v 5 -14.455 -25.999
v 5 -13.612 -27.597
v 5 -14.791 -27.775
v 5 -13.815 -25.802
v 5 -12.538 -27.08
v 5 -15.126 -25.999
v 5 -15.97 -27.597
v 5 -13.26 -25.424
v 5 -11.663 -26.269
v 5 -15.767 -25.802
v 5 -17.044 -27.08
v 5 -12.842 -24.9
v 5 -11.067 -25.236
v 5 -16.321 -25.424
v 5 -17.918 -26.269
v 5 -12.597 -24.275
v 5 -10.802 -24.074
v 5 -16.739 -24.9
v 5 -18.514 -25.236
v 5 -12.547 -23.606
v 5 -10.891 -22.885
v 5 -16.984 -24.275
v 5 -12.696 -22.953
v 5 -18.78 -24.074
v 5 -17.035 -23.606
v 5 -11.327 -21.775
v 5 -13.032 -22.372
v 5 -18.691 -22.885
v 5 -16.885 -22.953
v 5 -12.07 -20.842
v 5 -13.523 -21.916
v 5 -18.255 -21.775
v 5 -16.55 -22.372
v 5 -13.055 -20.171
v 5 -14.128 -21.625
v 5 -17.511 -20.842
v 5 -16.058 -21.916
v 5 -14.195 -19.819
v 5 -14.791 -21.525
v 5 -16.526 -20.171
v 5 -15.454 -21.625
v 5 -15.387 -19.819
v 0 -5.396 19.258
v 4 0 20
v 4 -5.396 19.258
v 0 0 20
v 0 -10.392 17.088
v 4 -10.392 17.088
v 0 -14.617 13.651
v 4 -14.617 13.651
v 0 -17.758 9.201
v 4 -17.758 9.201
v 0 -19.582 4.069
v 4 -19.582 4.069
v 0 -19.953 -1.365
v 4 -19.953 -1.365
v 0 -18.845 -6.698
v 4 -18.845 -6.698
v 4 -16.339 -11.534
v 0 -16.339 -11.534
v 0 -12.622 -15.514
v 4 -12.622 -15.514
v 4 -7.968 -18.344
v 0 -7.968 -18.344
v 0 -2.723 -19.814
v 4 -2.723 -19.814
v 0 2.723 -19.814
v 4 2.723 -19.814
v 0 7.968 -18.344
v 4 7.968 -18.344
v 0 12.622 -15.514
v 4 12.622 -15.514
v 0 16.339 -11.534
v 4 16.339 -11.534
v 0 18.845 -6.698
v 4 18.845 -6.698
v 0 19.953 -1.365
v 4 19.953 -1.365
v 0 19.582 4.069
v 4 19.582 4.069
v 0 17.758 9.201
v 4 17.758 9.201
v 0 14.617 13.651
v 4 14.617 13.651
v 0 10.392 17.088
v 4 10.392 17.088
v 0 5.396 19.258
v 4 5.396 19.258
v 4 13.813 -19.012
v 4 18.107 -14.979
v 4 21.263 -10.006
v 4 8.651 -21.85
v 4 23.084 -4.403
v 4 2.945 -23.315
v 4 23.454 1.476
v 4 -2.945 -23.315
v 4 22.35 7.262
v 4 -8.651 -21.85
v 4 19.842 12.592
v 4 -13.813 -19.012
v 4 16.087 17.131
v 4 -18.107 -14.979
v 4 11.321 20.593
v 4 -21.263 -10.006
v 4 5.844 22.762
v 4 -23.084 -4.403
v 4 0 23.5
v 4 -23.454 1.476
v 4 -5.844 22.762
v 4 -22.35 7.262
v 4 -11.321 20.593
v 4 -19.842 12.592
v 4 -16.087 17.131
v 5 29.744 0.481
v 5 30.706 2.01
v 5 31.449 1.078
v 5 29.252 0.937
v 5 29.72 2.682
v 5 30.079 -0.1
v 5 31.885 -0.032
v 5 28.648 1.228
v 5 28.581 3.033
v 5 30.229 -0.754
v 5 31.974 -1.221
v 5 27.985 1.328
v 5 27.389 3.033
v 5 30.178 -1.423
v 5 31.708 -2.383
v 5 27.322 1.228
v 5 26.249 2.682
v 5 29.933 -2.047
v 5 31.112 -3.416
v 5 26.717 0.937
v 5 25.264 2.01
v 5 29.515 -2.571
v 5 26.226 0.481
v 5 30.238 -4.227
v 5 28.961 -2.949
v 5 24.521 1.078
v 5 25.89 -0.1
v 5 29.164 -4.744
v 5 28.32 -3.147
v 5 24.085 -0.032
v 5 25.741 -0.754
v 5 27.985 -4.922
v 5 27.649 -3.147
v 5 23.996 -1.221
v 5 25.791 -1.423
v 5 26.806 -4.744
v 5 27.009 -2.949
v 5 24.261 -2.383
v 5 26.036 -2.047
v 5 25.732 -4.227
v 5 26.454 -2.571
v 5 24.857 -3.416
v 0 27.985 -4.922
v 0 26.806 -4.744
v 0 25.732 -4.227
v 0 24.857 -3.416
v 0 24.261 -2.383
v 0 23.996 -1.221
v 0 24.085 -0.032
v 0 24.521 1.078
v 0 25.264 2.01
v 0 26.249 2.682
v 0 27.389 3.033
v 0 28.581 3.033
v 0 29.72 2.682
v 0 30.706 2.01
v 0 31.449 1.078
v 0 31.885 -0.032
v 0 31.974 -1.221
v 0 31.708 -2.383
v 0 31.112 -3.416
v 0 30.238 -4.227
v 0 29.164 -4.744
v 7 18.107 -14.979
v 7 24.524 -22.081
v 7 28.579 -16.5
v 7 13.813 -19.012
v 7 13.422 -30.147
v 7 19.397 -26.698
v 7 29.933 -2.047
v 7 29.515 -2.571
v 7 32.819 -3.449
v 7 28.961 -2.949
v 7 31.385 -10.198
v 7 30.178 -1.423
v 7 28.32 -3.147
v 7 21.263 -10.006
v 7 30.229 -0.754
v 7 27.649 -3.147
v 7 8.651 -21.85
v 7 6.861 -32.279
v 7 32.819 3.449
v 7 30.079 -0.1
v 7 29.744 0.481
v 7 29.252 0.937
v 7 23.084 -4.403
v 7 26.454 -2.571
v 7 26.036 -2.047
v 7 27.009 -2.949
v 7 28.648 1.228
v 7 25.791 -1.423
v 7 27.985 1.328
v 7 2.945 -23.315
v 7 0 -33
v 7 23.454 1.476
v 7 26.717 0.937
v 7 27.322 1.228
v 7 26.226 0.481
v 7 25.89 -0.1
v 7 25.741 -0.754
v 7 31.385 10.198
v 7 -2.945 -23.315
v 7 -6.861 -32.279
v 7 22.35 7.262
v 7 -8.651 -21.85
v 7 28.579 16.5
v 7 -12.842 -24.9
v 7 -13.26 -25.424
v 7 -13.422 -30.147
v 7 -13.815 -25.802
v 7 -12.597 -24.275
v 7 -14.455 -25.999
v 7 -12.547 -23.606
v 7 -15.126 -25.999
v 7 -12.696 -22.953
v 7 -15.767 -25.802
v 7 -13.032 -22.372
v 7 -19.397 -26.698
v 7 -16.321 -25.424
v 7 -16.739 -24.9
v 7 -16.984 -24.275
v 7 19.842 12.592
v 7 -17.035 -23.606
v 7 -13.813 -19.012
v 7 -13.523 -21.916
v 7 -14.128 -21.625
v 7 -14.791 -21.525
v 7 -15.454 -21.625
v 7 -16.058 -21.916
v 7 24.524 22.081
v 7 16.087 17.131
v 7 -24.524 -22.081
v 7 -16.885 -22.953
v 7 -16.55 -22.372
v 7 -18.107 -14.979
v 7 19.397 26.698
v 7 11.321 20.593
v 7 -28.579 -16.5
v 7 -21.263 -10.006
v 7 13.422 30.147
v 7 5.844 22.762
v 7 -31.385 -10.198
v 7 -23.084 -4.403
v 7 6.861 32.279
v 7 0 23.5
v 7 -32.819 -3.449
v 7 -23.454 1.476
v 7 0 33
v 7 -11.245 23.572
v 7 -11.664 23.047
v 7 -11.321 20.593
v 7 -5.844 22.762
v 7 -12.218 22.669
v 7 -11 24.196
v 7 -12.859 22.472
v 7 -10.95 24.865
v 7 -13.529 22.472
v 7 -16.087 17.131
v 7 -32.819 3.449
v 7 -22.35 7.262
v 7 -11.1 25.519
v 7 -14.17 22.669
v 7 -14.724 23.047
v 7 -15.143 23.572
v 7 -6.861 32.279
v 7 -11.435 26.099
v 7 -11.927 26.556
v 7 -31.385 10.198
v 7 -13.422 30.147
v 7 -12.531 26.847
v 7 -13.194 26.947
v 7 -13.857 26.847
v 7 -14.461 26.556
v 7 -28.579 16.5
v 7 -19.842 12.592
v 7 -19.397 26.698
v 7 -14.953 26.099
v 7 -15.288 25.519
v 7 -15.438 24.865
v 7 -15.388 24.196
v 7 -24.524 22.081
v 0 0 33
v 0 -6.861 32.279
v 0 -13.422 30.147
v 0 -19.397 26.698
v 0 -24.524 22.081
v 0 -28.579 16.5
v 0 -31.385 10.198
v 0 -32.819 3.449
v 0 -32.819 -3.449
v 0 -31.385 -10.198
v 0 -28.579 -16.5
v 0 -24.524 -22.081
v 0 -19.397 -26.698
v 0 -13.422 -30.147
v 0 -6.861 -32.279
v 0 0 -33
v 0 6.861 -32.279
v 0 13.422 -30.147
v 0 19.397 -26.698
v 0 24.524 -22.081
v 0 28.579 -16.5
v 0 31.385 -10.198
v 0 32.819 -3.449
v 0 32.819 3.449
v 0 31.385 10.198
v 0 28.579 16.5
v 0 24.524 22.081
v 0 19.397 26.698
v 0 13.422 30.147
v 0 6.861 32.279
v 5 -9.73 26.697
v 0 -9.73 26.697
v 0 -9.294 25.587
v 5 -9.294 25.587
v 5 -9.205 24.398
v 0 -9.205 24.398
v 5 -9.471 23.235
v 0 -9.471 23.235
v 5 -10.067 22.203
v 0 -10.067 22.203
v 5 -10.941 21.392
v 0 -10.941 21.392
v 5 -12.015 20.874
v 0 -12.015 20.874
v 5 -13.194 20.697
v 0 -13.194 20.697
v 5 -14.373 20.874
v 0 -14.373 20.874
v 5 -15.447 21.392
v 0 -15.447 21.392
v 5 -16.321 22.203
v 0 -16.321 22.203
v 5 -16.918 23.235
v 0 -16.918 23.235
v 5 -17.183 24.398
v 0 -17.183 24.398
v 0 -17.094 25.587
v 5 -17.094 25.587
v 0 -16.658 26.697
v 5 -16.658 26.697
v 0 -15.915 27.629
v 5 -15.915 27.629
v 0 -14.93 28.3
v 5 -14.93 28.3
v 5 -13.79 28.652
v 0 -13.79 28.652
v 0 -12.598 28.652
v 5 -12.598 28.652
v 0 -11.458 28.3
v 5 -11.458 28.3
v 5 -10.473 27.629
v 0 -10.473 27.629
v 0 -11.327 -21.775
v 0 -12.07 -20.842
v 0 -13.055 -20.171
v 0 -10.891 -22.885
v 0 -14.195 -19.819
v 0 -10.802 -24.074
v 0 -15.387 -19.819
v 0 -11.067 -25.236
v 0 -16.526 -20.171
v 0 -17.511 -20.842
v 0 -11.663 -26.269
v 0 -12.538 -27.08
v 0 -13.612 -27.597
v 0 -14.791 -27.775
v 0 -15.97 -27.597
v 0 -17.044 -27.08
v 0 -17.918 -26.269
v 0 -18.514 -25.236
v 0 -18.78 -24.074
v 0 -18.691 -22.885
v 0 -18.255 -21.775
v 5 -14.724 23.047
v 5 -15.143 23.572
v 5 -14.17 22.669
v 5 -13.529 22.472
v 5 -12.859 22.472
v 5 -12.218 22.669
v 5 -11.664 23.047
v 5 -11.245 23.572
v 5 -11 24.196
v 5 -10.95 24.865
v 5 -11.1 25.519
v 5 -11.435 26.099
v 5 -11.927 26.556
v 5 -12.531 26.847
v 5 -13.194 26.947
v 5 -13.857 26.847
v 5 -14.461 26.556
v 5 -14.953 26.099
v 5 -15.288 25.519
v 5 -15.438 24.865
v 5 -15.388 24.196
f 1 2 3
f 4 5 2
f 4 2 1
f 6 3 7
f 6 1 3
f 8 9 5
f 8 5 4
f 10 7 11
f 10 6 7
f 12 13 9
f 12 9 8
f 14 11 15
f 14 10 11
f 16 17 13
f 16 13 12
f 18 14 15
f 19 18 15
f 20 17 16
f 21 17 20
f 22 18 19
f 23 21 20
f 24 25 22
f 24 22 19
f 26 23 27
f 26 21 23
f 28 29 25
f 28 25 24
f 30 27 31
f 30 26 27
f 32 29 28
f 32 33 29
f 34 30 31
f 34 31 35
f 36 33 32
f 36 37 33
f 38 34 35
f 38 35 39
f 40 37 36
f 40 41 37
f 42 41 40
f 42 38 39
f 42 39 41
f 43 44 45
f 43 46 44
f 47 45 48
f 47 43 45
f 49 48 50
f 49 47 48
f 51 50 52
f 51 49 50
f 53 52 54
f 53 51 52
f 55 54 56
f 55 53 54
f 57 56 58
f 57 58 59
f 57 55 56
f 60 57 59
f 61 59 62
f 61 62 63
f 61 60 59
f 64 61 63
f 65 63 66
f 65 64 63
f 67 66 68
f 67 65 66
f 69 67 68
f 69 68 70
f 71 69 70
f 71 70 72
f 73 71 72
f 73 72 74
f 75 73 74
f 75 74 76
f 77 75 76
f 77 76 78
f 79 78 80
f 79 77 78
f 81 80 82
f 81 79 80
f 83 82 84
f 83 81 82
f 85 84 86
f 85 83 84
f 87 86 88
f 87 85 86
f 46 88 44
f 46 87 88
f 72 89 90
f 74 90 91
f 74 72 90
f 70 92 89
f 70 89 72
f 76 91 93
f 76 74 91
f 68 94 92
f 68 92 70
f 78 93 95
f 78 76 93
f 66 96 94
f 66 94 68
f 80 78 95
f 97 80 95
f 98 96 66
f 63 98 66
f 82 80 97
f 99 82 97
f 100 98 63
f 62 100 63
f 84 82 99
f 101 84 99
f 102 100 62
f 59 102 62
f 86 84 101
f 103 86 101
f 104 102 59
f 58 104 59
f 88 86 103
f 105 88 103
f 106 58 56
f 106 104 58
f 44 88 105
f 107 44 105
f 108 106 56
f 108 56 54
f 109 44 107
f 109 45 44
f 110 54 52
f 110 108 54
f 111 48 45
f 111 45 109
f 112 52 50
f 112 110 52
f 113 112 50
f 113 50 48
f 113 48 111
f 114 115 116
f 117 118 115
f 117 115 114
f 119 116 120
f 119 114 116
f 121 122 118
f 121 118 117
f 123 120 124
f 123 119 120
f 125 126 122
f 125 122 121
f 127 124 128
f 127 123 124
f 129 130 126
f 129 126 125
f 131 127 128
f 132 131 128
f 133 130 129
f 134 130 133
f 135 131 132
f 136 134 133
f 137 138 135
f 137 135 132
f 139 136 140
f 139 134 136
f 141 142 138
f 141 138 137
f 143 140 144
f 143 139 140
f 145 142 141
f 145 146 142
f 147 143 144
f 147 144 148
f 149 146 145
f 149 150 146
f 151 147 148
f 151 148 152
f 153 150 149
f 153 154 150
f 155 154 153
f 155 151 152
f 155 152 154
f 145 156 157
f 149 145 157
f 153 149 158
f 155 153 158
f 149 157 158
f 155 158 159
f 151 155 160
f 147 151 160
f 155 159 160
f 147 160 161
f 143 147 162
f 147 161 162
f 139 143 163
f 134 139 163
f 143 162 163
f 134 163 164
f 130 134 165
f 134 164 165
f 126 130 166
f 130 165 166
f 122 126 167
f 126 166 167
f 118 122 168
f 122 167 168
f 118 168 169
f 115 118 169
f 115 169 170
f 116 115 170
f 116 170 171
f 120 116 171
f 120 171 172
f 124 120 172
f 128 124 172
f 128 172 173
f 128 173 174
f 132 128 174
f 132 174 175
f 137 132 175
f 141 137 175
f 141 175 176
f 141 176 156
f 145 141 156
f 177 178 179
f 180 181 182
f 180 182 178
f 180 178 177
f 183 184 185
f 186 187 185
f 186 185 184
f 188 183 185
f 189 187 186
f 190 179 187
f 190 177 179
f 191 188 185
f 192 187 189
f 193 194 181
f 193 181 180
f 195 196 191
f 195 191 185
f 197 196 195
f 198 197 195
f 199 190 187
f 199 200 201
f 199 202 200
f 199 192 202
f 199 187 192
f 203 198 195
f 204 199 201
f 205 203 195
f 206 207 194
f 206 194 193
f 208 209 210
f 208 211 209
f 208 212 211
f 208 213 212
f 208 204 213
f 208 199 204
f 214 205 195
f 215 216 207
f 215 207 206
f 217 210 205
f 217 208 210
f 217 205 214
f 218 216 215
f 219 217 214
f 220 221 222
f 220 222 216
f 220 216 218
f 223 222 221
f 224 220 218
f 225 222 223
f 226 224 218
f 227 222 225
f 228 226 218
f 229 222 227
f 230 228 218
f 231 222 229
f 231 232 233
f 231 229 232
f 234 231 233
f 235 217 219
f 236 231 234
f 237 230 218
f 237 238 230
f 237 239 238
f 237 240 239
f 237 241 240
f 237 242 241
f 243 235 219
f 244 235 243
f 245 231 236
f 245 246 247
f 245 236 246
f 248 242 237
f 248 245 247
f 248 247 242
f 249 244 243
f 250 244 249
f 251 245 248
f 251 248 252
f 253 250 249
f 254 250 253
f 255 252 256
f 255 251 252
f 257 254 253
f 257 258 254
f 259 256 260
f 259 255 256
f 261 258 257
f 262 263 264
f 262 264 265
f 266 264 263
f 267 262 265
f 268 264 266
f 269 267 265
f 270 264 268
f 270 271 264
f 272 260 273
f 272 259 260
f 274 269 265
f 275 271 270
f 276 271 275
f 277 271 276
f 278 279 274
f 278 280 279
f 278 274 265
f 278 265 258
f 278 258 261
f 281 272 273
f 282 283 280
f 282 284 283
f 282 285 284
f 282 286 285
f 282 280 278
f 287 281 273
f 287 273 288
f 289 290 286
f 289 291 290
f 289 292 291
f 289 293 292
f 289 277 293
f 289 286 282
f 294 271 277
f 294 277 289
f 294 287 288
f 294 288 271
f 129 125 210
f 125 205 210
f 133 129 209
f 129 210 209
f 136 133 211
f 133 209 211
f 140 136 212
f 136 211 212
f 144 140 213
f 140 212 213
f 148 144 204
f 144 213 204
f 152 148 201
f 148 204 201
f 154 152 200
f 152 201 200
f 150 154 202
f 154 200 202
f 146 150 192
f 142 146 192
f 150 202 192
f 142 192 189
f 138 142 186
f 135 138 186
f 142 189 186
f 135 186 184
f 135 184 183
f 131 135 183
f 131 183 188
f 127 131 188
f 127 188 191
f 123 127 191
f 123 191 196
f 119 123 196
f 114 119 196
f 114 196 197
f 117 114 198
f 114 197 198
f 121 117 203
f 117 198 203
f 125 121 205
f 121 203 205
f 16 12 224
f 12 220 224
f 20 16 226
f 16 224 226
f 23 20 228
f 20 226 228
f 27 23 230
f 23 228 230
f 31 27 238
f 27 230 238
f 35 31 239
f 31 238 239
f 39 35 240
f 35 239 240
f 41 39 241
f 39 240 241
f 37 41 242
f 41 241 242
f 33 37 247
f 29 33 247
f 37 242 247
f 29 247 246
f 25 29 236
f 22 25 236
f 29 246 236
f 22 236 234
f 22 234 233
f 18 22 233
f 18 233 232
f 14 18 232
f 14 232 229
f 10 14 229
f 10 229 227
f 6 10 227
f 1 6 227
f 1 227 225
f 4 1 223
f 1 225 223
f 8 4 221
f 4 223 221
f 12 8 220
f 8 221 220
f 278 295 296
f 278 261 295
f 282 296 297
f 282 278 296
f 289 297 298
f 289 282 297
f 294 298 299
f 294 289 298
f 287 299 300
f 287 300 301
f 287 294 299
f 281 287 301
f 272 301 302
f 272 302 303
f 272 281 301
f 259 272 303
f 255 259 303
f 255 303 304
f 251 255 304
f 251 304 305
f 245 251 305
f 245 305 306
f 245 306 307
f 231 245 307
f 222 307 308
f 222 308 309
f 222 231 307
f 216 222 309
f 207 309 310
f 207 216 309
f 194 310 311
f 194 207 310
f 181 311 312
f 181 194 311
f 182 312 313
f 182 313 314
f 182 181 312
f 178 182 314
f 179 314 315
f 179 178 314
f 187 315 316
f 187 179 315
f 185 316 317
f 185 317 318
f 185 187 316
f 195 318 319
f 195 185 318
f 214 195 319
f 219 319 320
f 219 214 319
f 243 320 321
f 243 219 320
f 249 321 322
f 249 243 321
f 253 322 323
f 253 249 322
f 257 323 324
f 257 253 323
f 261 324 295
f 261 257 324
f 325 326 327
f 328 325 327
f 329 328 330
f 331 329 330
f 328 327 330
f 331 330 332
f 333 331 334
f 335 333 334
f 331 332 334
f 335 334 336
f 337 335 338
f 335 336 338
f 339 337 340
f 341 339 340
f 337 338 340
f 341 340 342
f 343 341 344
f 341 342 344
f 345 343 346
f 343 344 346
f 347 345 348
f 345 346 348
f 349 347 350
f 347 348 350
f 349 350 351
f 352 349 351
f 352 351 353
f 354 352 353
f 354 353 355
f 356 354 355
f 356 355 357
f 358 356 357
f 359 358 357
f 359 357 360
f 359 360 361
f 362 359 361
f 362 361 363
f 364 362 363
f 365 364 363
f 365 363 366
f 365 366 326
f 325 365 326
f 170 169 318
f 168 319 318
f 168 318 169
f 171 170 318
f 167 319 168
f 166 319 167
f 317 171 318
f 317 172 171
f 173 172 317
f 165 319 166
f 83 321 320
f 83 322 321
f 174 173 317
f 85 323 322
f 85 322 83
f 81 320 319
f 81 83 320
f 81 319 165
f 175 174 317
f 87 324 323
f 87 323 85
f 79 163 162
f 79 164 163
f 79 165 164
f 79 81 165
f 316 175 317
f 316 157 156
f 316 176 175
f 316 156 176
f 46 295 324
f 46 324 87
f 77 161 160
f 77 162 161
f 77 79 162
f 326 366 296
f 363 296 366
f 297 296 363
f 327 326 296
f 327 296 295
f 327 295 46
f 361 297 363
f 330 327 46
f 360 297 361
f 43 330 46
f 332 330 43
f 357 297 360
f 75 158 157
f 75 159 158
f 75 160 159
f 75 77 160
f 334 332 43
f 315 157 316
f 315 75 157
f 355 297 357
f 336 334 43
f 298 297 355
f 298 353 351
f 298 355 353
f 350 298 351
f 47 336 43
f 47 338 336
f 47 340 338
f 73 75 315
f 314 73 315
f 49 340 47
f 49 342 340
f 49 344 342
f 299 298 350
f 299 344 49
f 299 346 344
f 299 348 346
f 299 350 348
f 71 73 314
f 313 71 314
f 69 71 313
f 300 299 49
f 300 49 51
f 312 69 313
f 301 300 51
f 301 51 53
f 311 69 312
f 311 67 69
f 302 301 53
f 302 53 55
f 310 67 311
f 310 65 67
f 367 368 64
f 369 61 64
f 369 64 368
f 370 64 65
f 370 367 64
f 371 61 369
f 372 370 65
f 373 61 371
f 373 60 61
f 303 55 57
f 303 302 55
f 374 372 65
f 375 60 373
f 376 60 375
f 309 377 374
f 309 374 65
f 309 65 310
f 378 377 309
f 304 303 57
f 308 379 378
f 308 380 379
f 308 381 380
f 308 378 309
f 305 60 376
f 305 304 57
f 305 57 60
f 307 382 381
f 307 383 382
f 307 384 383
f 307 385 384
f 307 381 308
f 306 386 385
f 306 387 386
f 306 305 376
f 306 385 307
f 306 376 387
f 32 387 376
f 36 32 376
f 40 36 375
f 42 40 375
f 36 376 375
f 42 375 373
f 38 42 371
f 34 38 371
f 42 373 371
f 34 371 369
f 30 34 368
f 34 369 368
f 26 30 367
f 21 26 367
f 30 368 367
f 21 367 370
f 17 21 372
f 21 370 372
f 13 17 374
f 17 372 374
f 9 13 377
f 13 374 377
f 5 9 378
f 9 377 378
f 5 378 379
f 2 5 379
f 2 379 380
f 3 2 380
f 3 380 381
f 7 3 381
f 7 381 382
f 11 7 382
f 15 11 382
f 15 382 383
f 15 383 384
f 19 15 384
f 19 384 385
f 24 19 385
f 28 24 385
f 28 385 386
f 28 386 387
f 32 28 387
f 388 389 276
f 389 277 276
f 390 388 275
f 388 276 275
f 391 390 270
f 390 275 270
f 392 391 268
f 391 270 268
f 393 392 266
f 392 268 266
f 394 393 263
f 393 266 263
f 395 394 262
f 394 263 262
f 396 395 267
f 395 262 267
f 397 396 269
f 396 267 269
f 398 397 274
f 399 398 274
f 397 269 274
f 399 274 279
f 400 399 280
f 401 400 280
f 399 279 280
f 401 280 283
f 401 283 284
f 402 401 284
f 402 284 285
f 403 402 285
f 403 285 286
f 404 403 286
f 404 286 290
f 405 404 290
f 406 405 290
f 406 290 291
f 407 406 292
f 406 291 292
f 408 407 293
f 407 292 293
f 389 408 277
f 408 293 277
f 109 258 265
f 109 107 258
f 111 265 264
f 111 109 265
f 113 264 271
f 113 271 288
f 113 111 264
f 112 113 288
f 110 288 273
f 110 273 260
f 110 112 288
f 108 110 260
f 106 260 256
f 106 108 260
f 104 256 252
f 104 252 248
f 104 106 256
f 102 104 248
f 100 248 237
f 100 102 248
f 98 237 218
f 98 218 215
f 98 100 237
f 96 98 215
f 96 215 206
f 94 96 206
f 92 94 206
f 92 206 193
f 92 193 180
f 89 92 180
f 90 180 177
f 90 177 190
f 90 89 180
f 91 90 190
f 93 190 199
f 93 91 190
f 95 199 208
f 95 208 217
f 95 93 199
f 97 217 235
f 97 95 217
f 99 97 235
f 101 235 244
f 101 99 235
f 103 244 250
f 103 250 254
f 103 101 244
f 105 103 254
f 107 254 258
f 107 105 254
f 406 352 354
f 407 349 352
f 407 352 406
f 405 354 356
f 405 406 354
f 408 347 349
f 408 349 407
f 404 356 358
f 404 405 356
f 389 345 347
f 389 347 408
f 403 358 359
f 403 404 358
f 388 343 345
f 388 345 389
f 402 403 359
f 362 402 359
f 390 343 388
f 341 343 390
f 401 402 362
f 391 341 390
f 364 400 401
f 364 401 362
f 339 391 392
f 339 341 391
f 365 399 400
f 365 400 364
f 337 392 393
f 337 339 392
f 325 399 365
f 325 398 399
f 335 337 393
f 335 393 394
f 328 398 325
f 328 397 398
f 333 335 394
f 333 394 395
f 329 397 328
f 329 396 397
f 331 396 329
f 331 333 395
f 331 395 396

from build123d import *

# Parameters (mm, degrees)
CHAMBRAGE_POUR_VIS_T_TE_HEXAGONALE_M41_D           = 4.5
CHAMBRAGE_POUR_VIS_T_TE_HEXAGONALE_M41_CBORE_D     = 8
CHAMBRAGE_POUR_VIS_T_TE_HEXAGONALE_M41_CBORE_DEPTH = 5
R_P_TITION_CIRCULAIRE1_COUNT                       = 3


with BuildPart() as part:
    # Esquisse1 → Révolution1 (revolve)
    with BuildSketch(Plane.XY, mode=Mode.PRIVATE) as r_volution1_sk:
        Polygon((0, 20), (0, 33), (7, 33), (7, 23.5), (4, 23.5), (4, 20), align=None)
    revolve(r_volution1_sk.sketch.rotate(Axis((-15.138230384, 0, 0), (1, 0, 0)), 90), axis=Axis((-15.138230384, 0, 0), (1, 0, 0)))

    # Chambrage pour vis à tête hexagonale M41 (through all)
    with Locations(Plane(origin=(0, 27.984819093, -0.921900388), x_dir=(0, 0, -1), z_dir=(-1, 0, 0))):
        with Locations((0, 0)):
            chambrage_pour_vis_t_te_hexagonale_m41 = CounterBoreHole(CHAMBRAGE_POUR_VIS_T_TE_HEXAGONALE_M41_D / 2, CHAMBRAGE_POUR_VIS_T_TE_HEXAGONALE_M41_CBORE_D / 2, CHAMBRAGE_POUR_VIS_T_TE_HEXAGONALE_M41_CBORE_DEPTH)

    # Répétition circulaire1: Chambrage pour vis à tête hexagonale M41 ×3 about axis
    r_p_tition_circulaire1_axis = Axis((0, 0, 0), (1, 0, 0))
    for i in range(1, R_P_TITION_CIRCULAIRE1_COUNT):
        add(chambrage_pour_vis_t_te_hexagonale_m41.rotate(r_p_tition_circulaire1_axis, i * 360 / R_P_TITION_CIRCULAIRE1_COUNT), mode=Mode.SUBTRACT)


solid = part.part
